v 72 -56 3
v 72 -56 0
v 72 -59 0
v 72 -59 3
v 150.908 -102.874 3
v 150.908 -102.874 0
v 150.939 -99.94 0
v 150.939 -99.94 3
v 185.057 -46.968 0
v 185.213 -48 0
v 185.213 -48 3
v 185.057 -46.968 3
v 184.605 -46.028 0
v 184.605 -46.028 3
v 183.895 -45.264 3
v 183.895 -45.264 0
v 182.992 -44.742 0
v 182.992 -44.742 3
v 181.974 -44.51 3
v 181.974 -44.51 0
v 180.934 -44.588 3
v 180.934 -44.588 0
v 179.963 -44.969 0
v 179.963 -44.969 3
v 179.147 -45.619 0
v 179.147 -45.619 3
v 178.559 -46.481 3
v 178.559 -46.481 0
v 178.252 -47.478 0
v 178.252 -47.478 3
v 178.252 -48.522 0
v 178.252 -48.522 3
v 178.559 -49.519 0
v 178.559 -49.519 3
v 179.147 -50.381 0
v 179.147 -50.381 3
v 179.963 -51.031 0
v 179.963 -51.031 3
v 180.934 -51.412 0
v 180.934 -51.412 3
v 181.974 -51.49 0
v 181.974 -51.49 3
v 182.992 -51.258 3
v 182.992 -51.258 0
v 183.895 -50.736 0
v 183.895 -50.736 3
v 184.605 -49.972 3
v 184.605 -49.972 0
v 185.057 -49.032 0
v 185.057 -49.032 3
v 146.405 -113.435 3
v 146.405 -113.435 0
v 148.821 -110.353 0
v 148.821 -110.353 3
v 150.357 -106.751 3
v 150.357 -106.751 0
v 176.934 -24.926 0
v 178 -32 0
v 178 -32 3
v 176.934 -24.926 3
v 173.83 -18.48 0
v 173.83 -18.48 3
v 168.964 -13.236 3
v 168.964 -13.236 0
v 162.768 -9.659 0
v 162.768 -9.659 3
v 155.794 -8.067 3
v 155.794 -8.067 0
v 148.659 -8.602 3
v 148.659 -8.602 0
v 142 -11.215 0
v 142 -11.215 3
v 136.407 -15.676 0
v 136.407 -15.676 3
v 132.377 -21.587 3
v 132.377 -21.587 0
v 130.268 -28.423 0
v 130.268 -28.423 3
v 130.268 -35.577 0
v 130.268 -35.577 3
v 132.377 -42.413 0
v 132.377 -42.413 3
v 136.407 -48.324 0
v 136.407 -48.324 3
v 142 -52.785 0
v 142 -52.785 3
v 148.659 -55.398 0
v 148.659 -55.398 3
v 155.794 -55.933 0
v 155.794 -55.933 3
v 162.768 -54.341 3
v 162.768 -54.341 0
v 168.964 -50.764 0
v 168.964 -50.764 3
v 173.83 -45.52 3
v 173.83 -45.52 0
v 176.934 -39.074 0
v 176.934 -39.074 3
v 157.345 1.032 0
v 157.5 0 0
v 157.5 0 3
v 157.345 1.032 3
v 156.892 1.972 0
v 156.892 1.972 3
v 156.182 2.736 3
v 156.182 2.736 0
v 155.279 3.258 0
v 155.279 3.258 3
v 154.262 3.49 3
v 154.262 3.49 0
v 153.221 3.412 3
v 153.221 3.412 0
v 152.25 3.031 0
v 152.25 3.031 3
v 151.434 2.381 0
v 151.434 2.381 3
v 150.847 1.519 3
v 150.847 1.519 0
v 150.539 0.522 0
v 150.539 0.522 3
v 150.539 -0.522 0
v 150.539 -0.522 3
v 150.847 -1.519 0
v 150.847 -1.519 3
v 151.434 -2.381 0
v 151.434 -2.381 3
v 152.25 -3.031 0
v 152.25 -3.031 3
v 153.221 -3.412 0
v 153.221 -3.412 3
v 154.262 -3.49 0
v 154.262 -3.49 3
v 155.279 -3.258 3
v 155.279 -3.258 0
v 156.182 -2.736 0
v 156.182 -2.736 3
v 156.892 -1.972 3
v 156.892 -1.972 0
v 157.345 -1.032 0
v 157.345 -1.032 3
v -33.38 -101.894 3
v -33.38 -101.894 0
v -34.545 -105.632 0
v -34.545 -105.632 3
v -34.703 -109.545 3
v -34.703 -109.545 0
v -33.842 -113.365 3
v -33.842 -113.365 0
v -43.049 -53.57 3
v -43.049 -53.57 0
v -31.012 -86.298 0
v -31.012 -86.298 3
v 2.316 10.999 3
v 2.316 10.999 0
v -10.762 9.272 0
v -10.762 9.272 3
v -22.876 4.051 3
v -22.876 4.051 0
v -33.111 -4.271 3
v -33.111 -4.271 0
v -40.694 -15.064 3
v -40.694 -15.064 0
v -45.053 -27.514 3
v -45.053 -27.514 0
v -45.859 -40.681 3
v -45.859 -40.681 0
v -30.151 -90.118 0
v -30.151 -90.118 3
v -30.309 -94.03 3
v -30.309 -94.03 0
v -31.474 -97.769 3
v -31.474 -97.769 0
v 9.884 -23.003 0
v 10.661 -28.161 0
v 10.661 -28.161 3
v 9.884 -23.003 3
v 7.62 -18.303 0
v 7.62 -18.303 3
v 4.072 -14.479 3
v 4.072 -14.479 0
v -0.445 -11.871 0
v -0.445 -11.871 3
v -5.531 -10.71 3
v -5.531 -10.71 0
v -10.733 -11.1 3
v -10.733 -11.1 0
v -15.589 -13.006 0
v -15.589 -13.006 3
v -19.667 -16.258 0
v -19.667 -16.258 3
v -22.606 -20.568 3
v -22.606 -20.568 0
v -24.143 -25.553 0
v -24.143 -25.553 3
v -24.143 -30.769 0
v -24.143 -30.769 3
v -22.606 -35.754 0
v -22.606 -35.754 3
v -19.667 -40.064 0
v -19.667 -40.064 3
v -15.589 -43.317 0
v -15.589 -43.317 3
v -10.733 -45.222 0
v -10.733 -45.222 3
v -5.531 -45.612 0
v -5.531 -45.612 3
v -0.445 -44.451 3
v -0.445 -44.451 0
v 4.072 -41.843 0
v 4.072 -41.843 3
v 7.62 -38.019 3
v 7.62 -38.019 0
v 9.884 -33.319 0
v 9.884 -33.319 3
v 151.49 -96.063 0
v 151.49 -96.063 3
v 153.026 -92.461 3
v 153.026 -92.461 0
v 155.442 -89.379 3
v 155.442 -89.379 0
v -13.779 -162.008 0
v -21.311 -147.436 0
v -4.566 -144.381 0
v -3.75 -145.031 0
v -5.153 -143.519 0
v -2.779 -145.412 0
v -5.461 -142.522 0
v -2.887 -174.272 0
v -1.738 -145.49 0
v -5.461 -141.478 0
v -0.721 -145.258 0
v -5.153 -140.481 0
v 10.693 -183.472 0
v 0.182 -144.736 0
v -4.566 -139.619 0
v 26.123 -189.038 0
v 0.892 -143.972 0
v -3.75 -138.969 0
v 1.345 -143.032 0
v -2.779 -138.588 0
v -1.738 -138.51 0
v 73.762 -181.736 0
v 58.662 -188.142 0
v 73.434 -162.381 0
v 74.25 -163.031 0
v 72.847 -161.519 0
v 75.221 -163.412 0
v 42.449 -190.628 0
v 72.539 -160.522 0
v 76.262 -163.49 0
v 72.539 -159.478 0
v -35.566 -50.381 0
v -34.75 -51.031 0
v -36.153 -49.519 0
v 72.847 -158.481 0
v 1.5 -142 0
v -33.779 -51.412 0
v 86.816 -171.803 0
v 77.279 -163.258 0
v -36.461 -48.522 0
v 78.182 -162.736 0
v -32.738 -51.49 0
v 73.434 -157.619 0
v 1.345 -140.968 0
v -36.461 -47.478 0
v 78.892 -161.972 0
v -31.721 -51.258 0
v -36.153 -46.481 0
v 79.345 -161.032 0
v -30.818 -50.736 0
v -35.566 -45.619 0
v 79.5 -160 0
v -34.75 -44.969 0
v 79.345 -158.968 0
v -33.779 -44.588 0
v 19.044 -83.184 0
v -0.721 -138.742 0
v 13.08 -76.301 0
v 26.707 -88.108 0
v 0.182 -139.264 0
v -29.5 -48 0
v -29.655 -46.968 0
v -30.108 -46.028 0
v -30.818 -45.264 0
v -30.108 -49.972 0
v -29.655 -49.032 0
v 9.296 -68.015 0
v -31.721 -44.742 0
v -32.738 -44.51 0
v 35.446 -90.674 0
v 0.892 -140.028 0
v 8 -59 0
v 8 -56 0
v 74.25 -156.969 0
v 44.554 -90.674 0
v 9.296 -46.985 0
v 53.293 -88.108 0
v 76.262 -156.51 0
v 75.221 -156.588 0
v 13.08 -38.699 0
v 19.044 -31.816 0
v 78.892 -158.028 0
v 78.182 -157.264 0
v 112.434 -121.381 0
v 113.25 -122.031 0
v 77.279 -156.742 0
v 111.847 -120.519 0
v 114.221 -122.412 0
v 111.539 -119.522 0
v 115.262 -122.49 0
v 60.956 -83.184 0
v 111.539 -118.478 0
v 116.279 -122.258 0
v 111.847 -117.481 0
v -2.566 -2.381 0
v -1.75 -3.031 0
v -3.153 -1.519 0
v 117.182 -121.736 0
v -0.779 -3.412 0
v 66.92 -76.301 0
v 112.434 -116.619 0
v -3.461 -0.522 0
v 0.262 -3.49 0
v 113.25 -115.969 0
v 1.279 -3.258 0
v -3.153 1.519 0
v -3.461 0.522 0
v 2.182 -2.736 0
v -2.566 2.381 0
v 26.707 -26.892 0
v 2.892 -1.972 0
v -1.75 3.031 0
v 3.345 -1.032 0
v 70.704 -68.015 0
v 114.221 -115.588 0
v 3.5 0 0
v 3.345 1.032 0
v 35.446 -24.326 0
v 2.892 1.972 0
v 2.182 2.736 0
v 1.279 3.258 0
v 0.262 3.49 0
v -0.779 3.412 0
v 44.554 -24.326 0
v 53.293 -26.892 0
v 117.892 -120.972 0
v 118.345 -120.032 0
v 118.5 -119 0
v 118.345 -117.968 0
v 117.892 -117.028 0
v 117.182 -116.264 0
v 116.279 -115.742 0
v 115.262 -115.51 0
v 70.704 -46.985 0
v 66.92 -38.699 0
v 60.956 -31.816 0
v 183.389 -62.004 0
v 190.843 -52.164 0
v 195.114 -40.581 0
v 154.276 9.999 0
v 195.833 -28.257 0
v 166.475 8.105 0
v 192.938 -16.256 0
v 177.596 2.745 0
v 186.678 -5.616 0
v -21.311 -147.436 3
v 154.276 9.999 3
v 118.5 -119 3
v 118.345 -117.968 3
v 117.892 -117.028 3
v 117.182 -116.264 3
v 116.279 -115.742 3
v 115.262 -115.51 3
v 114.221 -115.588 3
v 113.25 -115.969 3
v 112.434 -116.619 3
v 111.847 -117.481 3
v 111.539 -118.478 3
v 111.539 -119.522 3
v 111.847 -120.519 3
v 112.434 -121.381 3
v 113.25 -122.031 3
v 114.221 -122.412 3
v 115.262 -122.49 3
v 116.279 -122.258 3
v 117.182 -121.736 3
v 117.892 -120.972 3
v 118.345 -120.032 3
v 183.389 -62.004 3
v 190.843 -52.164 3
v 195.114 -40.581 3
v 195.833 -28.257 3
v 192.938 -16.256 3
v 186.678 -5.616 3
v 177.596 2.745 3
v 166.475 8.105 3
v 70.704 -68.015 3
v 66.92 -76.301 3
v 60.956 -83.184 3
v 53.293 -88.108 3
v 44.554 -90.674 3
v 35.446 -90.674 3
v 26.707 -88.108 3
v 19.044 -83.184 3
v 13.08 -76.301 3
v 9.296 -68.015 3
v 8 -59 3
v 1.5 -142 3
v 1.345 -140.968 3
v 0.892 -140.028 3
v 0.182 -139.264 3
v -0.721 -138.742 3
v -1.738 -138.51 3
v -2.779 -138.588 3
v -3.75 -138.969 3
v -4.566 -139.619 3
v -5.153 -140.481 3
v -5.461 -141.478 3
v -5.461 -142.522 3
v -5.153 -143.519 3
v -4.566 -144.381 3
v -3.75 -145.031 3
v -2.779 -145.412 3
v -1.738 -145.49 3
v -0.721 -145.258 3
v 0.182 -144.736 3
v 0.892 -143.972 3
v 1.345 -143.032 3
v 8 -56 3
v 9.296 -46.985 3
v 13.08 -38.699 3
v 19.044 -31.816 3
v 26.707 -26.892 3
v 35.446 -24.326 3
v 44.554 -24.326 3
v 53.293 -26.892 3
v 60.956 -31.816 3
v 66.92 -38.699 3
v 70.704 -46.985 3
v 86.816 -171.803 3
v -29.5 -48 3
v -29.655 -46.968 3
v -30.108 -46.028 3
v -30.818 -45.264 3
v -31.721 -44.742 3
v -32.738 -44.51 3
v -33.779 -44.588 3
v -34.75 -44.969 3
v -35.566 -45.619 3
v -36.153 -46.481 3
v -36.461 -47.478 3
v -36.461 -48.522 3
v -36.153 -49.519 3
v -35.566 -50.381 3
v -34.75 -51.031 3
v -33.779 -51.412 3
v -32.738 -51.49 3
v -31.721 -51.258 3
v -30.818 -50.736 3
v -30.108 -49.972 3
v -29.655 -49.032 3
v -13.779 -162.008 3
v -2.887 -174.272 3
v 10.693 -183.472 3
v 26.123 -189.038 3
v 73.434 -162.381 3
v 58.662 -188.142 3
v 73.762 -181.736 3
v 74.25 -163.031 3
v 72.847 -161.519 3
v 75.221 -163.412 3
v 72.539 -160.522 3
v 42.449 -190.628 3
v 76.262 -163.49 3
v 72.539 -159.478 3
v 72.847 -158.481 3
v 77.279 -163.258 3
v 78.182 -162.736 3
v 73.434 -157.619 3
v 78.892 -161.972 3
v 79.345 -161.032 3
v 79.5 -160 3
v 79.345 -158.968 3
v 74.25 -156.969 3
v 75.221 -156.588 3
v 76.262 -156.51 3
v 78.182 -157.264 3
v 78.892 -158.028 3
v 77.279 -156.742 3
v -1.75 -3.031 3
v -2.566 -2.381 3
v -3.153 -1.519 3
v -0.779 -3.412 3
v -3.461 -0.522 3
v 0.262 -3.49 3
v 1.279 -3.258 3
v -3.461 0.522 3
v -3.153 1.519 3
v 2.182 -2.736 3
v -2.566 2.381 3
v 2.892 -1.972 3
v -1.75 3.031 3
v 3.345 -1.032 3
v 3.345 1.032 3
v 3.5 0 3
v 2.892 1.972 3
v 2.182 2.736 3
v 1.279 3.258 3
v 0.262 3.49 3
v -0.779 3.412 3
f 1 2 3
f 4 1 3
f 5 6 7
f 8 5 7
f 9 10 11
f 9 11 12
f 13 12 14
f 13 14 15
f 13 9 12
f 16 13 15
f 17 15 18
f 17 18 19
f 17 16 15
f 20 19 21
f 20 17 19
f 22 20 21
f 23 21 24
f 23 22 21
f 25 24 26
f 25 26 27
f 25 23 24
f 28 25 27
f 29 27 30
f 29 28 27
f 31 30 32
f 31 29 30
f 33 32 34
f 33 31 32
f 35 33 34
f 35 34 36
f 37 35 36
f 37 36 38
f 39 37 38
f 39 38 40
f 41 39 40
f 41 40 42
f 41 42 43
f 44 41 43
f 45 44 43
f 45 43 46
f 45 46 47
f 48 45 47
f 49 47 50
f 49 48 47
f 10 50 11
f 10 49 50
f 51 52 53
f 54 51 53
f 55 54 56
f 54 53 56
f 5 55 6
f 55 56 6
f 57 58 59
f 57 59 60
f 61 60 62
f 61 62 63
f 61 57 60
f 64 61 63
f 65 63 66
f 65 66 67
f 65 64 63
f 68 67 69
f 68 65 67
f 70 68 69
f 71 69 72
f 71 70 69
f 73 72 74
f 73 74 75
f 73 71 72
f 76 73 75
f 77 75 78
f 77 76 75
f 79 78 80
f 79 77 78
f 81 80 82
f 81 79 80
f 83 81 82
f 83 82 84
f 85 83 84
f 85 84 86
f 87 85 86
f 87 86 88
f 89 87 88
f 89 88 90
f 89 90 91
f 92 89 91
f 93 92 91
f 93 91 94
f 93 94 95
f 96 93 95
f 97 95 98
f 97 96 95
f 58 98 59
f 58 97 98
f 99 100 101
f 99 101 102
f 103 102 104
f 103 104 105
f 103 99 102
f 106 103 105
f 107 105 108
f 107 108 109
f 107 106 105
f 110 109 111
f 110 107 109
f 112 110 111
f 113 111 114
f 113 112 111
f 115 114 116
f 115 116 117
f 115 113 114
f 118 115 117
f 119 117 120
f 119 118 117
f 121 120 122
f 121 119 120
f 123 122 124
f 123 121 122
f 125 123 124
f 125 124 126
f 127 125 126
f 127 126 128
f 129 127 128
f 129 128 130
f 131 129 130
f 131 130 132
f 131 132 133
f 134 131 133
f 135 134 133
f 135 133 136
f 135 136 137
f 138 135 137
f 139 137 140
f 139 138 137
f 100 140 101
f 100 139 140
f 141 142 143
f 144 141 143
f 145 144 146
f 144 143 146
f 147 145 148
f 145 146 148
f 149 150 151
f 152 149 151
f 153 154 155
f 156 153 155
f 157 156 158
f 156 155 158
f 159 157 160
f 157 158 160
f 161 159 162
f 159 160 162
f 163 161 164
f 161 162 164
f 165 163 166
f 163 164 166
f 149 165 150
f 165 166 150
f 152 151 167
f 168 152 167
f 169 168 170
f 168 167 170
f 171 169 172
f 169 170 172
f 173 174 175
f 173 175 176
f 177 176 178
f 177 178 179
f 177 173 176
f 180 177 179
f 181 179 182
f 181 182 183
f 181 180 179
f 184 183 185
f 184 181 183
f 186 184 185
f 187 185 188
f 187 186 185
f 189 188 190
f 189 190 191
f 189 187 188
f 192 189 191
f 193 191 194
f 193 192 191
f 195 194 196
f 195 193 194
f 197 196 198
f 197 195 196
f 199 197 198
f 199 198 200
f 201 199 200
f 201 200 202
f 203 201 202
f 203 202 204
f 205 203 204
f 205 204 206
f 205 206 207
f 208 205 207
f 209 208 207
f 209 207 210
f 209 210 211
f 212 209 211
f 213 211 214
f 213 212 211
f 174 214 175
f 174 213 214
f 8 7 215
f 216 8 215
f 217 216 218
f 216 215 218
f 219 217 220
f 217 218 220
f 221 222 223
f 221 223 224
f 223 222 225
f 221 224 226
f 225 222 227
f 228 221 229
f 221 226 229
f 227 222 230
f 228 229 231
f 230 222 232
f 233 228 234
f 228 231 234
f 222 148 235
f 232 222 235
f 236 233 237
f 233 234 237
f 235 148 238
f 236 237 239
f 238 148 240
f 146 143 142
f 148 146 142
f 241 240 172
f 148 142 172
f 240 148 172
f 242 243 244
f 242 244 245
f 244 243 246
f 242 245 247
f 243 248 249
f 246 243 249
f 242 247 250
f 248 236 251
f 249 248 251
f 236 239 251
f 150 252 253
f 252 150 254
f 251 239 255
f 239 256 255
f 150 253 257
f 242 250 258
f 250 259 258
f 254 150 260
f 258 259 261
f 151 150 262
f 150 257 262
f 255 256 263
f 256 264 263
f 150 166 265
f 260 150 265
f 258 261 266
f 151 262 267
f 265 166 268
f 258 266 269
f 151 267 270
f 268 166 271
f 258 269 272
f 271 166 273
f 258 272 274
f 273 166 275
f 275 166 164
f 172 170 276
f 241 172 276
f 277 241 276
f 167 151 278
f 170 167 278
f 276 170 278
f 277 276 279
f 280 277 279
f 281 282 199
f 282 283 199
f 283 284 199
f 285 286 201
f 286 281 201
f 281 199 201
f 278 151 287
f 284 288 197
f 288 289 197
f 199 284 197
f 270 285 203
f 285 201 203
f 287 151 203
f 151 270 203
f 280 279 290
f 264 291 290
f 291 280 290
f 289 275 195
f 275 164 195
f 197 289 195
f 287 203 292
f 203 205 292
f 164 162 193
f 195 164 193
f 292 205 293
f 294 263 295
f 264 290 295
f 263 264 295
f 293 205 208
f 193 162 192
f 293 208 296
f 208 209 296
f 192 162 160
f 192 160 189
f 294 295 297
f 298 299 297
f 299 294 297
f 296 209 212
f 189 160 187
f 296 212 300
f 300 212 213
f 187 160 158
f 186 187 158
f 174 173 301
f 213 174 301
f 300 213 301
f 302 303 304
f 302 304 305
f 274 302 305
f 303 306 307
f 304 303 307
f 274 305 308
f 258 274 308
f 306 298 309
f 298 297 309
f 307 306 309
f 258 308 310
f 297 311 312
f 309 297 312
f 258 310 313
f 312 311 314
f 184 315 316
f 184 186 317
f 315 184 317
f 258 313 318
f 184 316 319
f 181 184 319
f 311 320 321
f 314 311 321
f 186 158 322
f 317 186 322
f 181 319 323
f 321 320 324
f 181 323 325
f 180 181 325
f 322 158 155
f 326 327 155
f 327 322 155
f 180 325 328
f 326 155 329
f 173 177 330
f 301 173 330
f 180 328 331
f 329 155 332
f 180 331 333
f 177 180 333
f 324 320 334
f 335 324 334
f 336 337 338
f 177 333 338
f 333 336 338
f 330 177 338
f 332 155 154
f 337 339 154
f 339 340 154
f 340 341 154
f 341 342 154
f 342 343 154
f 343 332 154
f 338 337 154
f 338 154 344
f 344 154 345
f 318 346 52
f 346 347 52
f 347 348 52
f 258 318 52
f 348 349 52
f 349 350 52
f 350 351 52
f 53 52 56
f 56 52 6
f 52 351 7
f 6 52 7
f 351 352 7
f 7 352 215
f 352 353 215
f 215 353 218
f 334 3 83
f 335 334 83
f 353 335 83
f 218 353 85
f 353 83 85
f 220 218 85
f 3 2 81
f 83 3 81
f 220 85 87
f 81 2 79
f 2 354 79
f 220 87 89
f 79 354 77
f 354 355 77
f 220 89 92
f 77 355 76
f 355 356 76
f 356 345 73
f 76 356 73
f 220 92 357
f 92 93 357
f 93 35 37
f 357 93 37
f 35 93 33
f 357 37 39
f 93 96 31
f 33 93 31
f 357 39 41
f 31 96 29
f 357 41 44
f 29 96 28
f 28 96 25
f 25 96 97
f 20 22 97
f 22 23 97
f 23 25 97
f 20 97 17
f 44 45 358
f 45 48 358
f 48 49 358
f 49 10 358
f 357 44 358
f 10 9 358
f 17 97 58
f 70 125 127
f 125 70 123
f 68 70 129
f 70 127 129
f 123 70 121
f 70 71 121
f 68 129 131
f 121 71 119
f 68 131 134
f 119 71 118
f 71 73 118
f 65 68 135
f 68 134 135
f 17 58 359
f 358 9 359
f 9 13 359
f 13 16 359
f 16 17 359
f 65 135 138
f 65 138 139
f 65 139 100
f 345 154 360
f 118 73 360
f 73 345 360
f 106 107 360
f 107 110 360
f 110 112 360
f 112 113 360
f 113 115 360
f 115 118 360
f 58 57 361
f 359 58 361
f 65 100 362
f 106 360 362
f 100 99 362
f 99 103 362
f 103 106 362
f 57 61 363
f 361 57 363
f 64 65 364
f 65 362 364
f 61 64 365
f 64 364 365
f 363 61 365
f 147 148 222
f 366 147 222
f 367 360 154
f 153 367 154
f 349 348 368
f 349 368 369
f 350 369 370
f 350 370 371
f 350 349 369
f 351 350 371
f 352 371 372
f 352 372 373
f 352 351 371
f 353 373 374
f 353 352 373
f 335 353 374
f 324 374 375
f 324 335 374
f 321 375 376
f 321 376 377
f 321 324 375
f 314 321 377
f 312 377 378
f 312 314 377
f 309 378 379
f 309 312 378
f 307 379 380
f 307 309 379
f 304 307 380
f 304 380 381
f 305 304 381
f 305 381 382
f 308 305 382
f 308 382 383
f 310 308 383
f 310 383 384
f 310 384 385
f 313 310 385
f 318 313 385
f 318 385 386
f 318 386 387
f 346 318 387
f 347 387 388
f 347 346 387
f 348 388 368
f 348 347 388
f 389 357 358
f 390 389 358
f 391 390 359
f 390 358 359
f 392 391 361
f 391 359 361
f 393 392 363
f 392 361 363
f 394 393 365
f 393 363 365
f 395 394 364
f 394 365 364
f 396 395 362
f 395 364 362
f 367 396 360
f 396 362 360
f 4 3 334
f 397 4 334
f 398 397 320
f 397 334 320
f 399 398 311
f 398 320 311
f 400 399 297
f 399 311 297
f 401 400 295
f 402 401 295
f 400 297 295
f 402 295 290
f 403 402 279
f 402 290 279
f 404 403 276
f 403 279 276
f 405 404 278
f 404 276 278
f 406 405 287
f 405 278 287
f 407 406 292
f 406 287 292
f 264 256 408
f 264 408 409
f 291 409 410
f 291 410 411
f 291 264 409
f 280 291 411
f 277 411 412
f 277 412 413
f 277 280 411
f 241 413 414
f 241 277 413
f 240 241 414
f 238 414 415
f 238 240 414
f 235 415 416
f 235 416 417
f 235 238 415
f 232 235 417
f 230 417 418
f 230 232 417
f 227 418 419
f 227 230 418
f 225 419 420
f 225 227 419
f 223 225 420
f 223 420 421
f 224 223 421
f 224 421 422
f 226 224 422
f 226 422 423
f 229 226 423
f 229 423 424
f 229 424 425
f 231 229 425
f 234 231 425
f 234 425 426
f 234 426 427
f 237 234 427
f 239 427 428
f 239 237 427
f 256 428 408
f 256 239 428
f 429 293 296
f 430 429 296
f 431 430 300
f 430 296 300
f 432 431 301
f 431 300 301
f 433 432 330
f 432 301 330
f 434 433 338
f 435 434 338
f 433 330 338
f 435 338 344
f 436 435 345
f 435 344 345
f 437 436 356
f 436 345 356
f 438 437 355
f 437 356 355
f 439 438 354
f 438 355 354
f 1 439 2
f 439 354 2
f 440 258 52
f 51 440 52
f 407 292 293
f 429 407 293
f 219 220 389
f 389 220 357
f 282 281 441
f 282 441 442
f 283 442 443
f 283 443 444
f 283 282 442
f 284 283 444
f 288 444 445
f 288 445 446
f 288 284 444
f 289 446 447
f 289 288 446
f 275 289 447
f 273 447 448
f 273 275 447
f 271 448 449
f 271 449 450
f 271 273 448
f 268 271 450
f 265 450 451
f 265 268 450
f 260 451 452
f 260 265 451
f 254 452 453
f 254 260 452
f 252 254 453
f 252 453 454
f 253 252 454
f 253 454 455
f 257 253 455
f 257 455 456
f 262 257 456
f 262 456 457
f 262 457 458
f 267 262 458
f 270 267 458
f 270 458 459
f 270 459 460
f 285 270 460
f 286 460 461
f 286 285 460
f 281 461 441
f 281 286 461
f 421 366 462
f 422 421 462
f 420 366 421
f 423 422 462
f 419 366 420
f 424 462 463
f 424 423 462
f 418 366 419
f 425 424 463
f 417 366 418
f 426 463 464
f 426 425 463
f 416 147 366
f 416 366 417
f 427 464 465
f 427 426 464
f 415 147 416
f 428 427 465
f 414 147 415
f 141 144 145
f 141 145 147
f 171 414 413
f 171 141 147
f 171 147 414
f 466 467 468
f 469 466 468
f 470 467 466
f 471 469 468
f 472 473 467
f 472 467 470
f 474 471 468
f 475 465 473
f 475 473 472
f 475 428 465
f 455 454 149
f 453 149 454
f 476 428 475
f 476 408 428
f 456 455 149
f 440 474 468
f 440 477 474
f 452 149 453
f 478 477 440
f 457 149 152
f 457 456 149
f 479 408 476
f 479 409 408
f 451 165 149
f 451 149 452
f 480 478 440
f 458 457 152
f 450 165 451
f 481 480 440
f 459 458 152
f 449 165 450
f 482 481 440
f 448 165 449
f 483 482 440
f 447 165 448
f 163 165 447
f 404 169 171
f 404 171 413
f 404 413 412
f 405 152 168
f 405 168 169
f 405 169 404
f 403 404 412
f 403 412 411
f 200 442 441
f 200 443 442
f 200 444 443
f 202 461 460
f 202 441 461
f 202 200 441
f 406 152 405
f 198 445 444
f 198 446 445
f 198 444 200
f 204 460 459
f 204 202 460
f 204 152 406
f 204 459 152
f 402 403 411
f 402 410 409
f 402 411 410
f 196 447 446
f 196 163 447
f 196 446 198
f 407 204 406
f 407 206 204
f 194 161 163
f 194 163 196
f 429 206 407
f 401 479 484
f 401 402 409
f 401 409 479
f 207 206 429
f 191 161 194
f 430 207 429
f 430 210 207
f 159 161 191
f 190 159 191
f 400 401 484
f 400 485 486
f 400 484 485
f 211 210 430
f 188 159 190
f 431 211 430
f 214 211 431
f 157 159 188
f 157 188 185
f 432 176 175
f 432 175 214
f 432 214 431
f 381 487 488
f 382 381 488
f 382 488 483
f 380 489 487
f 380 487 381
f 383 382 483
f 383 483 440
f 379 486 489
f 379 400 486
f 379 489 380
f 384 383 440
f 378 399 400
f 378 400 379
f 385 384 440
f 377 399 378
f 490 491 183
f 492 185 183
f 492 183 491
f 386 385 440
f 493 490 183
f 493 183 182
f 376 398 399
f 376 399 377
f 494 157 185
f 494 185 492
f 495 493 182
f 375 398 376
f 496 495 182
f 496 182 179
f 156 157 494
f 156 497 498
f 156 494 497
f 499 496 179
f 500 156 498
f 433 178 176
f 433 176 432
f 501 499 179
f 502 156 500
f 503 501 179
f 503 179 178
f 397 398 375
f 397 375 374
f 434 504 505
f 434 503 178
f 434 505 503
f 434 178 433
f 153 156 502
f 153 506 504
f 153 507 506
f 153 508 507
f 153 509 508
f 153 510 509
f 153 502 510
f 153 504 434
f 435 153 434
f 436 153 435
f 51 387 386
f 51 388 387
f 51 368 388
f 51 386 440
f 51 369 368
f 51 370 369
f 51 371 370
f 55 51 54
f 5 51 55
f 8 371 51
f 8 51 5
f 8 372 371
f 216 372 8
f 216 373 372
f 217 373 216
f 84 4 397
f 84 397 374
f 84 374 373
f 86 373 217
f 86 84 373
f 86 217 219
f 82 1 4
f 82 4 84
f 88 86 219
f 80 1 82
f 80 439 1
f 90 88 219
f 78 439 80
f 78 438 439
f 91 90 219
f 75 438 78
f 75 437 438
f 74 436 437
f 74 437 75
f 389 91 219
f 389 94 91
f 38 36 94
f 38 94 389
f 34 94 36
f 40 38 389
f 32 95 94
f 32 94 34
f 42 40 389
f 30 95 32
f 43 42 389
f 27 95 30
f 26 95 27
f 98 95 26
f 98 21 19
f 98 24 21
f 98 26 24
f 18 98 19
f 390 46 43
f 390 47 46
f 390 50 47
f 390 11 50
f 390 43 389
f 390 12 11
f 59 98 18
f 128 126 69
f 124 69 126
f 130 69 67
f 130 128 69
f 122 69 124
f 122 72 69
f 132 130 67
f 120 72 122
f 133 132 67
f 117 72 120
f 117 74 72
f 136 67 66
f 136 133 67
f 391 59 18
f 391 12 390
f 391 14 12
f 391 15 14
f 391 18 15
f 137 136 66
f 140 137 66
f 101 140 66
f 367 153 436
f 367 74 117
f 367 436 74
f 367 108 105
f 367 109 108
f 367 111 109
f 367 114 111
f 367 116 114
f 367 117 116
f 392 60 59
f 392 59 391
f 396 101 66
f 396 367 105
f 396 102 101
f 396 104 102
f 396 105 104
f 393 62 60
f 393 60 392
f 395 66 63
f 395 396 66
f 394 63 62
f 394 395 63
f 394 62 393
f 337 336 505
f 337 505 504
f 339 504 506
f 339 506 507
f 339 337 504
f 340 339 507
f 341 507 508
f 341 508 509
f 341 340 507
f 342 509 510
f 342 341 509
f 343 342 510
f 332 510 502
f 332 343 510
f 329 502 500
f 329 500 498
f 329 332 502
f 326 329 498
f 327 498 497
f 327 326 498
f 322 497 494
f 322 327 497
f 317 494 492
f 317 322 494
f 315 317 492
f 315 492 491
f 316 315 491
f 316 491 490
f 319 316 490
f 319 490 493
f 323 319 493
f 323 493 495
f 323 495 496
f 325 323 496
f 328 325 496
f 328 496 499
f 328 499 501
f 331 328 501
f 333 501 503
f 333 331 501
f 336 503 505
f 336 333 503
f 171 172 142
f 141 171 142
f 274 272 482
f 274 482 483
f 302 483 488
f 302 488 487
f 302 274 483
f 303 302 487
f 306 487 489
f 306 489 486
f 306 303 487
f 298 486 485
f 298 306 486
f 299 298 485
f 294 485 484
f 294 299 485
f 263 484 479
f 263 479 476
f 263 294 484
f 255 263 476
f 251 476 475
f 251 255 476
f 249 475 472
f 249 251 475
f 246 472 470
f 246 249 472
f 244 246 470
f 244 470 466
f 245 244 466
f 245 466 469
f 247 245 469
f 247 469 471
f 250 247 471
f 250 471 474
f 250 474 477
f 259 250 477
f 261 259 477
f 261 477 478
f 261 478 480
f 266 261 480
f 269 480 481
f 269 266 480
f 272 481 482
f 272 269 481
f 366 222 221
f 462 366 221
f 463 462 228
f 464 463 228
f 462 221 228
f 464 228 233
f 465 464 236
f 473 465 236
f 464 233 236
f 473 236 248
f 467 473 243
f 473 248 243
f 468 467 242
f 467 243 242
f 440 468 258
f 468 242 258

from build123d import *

# Parameters (mm, degrees)
F0_R     = 3.5
F0_R_2   = 17.5
F0_R_3   = 24
F1_DEPTH = 3


with BuildPart() as f1:
    # F0 (on Top) → F1 (new body)
    with BuildSketch(Plane.XY):
        with BuildLine():
            Line((154.276346, 9.999091), (2.315824, 10.998961))
            ThreePointArc((2.315824, 10.998961), (-37.275268, -9.405556), (-43.049419, -53.569546))
            Line((-43.049419, -53.569546), (-31.011758, -86.297638))
            ThreePointArc((-31.011758, -86.297638), (-30.101849, -92.079184), (-31.473705, -97.768843))
            Line((-31.473705, -97.768843), (-33.380198, -101.893724))
            ThreePointArc((-33.380198, -101.893724), (-34.752053, -107.583383), (-33.842145, -113.364929))
            Line((-33.842145, -113.364929), (-21.310521, -147.436013))
            ThreePointArc((-21.310521, -147.436013), (26.12288, -189.038234), (86.815639, -171.802768))
            Line((86.815639, -171.802768), (146.405169, -113.43495))
            ThreePointArc((146.405169, -113.43495), (149.706985, -108.602536), (150.908181, -102.874418))
            Line((150.908181, -102.874418), (150.938576, -99.93974))
            ThreePointArc((150.938576, -99.93974), (152.139772, -94.211622), (155.441588, -89.379208))
            Line((155.441588, -89.379208), (183.389314, -62.00447))
            ThreePointArc((183.389314, -62.00447), (192.937656, -16.256463), (154.276346, 9.999091))
        make_face()
        with Locations((-2, -142)):
            Circle(F0_R, mode=Mode.SUBTRACT)
        with Locations((76, -160)):
            Circle(F0_R, mode=Mode.SUBTRACT)
        with Locations((115, -119)):
            Circle(F0_R, mode=Mode.SUBTRACT)
        with Locations((-33, -48)):
            Circle(F0_R, mode=Mode.SUBTRACT)
        with BuildLine():
            ThreePointArc((8, -56), (40, -24), (72, -56))
            Line((72, -56), (72, -59))
            ThreePointArc((72, -59), (40, -91), (8, -59))
            Line((8, -59), (8, -56))
        make_face(mode=Mode.SUBTRACT)
        with Locations((-6.838835, -28.161165)):
            Circle(F0_R_2, mode=Mode.SUBTRACT)
        Circle(F0_R, mode=Mode.SUBTRACT)
        with Locations((181.712813, -48)):
            Circle(F0_R, mode=Mode.SUBTRACT)
        with Locations((154, -32)):
            Circle(F0_R_3, mode=Mode.SUBTRACT)
        with Locations((154, 0)):
            Circle(F0_R, mode=Mode.SUBTRACT)
    extrude(amount=F1_DEPTH)


solid = f1.part
